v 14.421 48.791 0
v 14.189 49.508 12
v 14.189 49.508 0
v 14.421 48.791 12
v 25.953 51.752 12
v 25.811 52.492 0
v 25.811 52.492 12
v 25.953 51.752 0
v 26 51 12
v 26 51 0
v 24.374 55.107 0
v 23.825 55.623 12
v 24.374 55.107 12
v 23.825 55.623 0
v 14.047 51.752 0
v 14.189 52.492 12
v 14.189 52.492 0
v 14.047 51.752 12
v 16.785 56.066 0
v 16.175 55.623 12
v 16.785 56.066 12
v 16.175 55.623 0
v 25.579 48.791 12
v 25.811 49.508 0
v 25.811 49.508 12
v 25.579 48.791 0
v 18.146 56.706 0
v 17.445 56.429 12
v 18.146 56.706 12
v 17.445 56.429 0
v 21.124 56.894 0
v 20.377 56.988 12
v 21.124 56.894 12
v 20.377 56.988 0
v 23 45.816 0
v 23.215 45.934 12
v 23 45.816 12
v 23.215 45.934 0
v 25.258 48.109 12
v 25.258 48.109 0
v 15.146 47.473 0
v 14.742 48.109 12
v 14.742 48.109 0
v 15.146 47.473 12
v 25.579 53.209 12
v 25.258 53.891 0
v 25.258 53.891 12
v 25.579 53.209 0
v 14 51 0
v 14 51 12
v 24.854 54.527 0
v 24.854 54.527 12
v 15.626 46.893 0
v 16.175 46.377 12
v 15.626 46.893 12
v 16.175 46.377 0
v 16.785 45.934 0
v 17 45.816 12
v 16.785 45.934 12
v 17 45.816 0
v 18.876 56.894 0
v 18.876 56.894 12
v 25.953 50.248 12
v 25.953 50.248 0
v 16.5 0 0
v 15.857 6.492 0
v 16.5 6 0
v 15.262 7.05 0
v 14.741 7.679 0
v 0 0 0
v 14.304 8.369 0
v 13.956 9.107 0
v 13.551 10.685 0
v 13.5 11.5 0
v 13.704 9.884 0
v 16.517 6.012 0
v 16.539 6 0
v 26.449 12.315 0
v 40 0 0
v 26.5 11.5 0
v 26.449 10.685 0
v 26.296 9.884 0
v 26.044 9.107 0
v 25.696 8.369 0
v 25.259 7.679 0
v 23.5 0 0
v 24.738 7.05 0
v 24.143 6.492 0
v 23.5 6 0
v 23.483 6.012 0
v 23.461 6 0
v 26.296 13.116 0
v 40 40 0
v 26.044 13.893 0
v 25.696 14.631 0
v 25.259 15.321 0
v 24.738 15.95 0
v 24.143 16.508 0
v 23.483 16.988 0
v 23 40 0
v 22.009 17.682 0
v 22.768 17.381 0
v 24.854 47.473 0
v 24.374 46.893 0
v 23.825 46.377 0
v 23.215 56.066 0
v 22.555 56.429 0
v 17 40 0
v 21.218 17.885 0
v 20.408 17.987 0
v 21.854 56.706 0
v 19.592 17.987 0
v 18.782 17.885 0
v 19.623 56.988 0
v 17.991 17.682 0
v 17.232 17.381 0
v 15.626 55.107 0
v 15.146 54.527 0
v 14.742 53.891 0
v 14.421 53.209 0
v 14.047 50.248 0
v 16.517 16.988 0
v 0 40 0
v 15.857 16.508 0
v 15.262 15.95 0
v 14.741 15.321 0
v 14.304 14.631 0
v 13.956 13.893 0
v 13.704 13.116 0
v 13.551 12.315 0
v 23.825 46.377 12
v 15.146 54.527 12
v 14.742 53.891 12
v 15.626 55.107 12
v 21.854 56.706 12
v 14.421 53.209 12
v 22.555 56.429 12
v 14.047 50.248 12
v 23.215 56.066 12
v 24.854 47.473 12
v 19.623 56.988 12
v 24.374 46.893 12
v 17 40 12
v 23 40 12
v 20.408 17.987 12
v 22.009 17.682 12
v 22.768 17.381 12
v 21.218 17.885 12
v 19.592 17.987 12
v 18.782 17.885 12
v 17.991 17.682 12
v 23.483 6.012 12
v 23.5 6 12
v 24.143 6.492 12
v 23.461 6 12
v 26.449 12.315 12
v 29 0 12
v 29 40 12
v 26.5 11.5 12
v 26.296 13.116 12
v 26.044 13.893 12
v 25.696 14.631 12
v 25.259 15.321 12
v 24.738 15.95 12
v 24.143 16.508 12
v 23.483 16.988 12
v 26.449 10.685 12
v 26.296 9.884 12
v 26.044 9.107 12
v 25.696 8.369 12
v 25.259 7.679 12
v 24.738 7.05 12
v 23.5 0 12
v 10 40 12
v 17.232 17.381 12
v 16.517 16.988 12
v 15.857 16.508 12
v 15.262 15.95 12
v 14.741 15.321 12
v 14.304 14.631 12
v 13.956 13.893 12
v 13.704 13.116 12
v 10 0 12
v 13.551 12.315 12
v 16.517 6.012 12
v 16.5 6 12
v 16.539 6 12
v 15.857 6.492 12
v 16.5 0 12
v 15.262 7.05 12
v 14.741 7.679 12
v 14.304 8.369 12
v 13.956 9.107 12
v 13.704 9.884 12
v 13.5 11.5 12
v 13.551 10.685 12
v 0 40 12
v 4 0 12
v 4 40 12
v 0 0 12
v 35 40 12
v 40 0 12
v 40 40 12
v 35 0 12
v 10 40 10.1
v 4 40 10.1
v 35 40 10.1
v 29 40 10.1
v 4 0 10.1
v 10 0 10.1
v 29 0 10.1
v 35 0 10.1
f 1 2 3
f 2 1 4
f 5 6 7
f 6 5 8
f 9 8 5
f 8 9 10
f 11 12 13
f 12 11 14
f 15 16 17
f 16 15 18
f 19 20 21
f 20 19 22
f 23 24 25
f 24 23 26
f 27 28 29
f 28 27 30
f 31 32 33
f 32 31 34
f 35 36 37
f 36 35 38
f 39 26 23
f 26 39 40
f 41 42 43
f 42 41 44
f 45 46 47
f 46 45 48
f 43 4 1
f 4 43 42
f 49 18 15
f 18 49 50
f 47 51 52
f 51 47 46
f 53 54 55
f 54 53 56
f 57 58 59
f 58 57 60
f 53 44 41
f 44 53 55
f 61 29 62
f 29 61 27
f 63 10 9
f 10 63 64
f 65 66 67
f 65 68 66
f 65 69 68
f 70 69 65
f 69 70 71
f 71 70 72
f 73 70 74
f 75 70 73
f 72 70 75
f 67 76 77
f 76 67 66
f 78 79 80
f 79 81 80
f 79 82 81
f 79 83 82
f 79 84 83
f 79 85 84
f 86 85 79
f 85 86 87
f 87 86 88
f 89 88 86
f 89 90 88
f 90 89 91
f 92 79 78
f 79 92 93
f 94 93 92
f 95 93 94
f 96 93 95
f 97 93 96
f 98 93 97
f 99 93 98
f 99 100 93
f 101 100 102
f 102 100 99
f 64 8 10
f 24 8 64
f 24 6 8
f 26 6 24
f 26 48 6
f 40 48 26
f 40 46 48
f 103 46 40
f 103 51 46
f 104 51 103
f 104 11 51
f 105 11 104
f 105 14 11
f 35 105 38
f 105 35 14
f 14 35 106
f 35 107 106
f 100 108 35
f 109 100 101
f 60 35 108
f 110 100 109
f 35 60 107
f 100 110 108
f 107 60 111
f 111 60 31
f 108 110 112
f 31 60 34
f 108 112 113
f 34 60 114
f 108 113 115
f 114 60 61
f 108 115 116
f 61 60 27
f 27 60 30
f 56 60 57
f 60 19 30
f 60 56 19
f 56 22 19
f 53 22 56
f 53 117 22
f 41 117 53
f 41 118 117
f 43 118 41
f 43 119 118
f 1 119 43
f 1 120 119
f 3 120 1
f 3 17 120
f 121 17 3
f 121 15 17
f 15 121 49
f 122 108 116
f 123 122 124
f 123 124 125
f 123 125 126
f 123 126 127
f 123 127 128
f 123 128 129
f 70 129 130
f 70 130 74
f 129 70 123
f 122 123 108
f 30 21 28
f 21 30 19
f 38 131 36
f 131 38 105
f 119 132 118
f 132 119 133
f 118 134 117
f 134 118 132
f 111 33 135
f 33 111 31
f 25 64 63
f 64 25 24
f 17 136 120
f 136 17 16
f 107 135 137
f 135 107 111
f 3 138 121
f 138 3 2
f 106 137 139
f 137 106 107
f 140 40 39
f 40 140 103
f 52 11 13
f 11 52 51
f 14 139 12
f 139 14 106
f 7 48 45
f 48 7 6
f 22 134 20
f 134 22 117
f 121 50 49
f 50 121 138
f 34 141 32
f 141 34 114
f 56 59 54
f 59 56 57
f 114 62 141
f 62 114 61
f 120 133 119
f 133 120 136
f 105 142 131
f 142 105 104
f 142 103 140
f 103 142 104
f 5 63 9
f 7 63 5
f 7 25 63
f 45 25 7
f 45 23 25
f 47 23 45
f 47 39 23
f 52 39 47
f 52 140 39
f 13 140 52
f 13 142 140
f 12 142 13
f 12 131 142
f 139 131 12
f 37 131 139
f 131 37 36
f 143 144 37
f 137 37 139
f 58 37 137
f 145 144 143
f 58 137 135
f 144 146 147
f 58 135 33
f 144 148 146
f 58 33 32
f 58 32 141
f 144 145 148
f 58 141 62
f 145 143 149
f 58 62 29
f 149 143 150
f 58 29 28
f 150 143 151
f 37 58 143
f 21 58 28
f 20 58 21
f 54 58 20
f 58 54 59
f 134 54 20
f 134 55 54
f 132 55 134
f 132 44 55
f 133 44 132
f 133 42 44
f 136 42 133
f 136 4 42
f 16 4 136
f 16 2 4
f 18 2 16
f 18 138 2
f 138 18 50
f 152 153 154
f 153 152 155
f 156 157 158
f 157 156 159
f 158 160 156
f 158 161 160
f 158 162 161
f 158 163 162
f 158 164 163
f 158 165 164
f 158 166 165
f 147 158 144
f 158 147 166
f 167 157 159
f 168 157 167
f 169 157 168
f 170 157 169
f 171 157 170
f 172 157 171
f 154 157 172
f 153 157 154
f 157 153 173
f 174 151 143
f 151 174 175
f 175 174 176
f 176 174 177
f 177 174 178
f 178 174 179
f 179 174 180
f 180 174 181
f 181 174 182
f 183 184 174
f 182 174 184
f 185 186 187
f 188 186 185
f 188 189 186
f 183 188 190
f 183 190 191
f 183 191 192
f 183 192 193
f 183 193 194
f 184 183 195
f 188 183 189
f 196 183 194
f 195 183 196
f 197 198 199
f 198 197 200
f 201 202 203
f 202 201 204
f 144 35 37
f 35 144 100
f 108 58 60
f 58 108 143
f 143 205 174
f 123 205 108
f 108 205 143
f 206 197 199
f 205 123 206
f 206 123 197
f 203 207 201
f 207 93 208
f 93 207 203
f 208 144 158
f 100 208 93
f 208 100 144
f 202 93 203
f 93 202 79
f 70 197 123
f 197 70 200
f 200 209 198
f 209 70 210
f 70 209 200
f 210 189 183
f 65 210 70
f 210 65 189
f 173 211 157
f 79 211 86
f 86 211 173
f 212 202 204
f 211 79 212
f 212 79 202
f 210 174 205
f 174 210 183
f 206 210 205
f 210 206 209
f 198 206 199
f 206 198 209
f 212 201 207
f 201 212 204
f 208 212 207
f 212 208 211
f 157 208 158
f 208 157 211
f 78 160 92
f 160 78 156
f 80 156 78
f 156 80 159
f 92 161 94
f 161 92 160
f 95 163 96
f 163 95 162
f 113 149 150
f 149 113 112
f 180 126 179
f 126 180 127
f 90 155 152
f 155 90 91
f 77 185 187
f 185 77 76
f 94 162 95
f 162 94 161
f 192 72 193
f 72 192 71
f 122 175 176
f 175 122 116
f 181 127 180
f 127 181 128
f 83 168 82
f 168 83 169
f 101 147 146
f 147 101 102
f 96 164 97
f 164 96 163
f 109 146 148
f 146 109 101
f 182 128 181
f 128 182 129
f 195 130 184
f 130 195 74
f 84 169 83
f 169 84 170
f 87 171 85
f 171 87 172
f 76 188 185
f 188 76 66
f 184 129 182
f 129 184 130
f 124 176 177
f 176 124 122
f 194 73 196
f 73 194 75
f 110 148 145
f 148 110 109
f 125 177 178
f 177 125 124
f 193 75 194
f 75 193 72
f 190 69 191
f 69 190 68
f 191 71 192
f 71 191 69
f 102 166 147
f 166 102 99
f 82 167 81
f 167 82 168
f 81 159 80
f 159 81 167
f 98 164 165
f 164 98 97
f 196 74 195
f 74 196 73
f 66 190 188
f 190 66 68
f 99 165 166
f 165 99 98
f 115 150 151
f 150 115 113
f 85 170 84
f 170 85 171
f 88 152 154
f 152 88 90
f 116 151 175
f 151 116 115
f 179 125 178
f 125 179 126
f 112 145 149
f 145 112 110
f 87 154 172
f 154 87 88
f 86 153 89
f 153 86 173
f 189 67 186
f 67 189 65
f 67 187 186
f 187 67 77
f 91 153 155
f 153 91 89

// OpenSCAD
$fn=50;
e = 0.1;

// train track
width=40;
thickness=12;
conn_male_circle_diameter=12;
conn_male_straight_width=6;
conn_male_straight_length=6;
conn_female_circle_diameter=13;
conn_female_straight_width=7;
conn_female_straight_length=6;
track_side=4;
track_inset=6;
track_inset_depth=2;
track_mid=19;


// track
track_length=40;
translate([width / 2, track_length, 0])
    male_connector();
difference()
{
    track(track_length);
    
    translate([width / 2, 0, 0])
        female_connector();
}


module track(track_length)
{
    difference()
    {
        cube([width, track_length, thickness]);
        
        translate([track_side, 0, thickness - track_inset_depth + e])
            cube([track_inset, track_length, track_inset_depth]);
        
        translate([track_side + track_inset + track_mid, 0, thickness - track_inset_depth + e])
            cube([track_inset, track_length, track_inset_depth]);
    }
}

module male_connector()
{
    translate([-conn_male_straight_width / 2, 0, 0])
    {
        translate([conn_male_straight_width / 2, conn_male_straight_length + conn_male_circle_diameter / 2 - 1, 0])
            cylinder(thickness, r=conn_male_circle_diameter / 2);
        cube([conn_male_straight_width, conn_male_straight_length, thickness]);
    }
}

module female_connector()
{
    translate([-conn_female_straight_width / 2, 0, 0])
    {
        translate([conn_female_straight_width / 2, conn_female_straight_length + conn_female_circle_diameter / 2 - 1, 0])
            cylinder(thickness, r=conn_female_circle_diameter / 2);
        cube([conn_female_straight_width, conn_female_straight_length, thickness]);
    }
}
